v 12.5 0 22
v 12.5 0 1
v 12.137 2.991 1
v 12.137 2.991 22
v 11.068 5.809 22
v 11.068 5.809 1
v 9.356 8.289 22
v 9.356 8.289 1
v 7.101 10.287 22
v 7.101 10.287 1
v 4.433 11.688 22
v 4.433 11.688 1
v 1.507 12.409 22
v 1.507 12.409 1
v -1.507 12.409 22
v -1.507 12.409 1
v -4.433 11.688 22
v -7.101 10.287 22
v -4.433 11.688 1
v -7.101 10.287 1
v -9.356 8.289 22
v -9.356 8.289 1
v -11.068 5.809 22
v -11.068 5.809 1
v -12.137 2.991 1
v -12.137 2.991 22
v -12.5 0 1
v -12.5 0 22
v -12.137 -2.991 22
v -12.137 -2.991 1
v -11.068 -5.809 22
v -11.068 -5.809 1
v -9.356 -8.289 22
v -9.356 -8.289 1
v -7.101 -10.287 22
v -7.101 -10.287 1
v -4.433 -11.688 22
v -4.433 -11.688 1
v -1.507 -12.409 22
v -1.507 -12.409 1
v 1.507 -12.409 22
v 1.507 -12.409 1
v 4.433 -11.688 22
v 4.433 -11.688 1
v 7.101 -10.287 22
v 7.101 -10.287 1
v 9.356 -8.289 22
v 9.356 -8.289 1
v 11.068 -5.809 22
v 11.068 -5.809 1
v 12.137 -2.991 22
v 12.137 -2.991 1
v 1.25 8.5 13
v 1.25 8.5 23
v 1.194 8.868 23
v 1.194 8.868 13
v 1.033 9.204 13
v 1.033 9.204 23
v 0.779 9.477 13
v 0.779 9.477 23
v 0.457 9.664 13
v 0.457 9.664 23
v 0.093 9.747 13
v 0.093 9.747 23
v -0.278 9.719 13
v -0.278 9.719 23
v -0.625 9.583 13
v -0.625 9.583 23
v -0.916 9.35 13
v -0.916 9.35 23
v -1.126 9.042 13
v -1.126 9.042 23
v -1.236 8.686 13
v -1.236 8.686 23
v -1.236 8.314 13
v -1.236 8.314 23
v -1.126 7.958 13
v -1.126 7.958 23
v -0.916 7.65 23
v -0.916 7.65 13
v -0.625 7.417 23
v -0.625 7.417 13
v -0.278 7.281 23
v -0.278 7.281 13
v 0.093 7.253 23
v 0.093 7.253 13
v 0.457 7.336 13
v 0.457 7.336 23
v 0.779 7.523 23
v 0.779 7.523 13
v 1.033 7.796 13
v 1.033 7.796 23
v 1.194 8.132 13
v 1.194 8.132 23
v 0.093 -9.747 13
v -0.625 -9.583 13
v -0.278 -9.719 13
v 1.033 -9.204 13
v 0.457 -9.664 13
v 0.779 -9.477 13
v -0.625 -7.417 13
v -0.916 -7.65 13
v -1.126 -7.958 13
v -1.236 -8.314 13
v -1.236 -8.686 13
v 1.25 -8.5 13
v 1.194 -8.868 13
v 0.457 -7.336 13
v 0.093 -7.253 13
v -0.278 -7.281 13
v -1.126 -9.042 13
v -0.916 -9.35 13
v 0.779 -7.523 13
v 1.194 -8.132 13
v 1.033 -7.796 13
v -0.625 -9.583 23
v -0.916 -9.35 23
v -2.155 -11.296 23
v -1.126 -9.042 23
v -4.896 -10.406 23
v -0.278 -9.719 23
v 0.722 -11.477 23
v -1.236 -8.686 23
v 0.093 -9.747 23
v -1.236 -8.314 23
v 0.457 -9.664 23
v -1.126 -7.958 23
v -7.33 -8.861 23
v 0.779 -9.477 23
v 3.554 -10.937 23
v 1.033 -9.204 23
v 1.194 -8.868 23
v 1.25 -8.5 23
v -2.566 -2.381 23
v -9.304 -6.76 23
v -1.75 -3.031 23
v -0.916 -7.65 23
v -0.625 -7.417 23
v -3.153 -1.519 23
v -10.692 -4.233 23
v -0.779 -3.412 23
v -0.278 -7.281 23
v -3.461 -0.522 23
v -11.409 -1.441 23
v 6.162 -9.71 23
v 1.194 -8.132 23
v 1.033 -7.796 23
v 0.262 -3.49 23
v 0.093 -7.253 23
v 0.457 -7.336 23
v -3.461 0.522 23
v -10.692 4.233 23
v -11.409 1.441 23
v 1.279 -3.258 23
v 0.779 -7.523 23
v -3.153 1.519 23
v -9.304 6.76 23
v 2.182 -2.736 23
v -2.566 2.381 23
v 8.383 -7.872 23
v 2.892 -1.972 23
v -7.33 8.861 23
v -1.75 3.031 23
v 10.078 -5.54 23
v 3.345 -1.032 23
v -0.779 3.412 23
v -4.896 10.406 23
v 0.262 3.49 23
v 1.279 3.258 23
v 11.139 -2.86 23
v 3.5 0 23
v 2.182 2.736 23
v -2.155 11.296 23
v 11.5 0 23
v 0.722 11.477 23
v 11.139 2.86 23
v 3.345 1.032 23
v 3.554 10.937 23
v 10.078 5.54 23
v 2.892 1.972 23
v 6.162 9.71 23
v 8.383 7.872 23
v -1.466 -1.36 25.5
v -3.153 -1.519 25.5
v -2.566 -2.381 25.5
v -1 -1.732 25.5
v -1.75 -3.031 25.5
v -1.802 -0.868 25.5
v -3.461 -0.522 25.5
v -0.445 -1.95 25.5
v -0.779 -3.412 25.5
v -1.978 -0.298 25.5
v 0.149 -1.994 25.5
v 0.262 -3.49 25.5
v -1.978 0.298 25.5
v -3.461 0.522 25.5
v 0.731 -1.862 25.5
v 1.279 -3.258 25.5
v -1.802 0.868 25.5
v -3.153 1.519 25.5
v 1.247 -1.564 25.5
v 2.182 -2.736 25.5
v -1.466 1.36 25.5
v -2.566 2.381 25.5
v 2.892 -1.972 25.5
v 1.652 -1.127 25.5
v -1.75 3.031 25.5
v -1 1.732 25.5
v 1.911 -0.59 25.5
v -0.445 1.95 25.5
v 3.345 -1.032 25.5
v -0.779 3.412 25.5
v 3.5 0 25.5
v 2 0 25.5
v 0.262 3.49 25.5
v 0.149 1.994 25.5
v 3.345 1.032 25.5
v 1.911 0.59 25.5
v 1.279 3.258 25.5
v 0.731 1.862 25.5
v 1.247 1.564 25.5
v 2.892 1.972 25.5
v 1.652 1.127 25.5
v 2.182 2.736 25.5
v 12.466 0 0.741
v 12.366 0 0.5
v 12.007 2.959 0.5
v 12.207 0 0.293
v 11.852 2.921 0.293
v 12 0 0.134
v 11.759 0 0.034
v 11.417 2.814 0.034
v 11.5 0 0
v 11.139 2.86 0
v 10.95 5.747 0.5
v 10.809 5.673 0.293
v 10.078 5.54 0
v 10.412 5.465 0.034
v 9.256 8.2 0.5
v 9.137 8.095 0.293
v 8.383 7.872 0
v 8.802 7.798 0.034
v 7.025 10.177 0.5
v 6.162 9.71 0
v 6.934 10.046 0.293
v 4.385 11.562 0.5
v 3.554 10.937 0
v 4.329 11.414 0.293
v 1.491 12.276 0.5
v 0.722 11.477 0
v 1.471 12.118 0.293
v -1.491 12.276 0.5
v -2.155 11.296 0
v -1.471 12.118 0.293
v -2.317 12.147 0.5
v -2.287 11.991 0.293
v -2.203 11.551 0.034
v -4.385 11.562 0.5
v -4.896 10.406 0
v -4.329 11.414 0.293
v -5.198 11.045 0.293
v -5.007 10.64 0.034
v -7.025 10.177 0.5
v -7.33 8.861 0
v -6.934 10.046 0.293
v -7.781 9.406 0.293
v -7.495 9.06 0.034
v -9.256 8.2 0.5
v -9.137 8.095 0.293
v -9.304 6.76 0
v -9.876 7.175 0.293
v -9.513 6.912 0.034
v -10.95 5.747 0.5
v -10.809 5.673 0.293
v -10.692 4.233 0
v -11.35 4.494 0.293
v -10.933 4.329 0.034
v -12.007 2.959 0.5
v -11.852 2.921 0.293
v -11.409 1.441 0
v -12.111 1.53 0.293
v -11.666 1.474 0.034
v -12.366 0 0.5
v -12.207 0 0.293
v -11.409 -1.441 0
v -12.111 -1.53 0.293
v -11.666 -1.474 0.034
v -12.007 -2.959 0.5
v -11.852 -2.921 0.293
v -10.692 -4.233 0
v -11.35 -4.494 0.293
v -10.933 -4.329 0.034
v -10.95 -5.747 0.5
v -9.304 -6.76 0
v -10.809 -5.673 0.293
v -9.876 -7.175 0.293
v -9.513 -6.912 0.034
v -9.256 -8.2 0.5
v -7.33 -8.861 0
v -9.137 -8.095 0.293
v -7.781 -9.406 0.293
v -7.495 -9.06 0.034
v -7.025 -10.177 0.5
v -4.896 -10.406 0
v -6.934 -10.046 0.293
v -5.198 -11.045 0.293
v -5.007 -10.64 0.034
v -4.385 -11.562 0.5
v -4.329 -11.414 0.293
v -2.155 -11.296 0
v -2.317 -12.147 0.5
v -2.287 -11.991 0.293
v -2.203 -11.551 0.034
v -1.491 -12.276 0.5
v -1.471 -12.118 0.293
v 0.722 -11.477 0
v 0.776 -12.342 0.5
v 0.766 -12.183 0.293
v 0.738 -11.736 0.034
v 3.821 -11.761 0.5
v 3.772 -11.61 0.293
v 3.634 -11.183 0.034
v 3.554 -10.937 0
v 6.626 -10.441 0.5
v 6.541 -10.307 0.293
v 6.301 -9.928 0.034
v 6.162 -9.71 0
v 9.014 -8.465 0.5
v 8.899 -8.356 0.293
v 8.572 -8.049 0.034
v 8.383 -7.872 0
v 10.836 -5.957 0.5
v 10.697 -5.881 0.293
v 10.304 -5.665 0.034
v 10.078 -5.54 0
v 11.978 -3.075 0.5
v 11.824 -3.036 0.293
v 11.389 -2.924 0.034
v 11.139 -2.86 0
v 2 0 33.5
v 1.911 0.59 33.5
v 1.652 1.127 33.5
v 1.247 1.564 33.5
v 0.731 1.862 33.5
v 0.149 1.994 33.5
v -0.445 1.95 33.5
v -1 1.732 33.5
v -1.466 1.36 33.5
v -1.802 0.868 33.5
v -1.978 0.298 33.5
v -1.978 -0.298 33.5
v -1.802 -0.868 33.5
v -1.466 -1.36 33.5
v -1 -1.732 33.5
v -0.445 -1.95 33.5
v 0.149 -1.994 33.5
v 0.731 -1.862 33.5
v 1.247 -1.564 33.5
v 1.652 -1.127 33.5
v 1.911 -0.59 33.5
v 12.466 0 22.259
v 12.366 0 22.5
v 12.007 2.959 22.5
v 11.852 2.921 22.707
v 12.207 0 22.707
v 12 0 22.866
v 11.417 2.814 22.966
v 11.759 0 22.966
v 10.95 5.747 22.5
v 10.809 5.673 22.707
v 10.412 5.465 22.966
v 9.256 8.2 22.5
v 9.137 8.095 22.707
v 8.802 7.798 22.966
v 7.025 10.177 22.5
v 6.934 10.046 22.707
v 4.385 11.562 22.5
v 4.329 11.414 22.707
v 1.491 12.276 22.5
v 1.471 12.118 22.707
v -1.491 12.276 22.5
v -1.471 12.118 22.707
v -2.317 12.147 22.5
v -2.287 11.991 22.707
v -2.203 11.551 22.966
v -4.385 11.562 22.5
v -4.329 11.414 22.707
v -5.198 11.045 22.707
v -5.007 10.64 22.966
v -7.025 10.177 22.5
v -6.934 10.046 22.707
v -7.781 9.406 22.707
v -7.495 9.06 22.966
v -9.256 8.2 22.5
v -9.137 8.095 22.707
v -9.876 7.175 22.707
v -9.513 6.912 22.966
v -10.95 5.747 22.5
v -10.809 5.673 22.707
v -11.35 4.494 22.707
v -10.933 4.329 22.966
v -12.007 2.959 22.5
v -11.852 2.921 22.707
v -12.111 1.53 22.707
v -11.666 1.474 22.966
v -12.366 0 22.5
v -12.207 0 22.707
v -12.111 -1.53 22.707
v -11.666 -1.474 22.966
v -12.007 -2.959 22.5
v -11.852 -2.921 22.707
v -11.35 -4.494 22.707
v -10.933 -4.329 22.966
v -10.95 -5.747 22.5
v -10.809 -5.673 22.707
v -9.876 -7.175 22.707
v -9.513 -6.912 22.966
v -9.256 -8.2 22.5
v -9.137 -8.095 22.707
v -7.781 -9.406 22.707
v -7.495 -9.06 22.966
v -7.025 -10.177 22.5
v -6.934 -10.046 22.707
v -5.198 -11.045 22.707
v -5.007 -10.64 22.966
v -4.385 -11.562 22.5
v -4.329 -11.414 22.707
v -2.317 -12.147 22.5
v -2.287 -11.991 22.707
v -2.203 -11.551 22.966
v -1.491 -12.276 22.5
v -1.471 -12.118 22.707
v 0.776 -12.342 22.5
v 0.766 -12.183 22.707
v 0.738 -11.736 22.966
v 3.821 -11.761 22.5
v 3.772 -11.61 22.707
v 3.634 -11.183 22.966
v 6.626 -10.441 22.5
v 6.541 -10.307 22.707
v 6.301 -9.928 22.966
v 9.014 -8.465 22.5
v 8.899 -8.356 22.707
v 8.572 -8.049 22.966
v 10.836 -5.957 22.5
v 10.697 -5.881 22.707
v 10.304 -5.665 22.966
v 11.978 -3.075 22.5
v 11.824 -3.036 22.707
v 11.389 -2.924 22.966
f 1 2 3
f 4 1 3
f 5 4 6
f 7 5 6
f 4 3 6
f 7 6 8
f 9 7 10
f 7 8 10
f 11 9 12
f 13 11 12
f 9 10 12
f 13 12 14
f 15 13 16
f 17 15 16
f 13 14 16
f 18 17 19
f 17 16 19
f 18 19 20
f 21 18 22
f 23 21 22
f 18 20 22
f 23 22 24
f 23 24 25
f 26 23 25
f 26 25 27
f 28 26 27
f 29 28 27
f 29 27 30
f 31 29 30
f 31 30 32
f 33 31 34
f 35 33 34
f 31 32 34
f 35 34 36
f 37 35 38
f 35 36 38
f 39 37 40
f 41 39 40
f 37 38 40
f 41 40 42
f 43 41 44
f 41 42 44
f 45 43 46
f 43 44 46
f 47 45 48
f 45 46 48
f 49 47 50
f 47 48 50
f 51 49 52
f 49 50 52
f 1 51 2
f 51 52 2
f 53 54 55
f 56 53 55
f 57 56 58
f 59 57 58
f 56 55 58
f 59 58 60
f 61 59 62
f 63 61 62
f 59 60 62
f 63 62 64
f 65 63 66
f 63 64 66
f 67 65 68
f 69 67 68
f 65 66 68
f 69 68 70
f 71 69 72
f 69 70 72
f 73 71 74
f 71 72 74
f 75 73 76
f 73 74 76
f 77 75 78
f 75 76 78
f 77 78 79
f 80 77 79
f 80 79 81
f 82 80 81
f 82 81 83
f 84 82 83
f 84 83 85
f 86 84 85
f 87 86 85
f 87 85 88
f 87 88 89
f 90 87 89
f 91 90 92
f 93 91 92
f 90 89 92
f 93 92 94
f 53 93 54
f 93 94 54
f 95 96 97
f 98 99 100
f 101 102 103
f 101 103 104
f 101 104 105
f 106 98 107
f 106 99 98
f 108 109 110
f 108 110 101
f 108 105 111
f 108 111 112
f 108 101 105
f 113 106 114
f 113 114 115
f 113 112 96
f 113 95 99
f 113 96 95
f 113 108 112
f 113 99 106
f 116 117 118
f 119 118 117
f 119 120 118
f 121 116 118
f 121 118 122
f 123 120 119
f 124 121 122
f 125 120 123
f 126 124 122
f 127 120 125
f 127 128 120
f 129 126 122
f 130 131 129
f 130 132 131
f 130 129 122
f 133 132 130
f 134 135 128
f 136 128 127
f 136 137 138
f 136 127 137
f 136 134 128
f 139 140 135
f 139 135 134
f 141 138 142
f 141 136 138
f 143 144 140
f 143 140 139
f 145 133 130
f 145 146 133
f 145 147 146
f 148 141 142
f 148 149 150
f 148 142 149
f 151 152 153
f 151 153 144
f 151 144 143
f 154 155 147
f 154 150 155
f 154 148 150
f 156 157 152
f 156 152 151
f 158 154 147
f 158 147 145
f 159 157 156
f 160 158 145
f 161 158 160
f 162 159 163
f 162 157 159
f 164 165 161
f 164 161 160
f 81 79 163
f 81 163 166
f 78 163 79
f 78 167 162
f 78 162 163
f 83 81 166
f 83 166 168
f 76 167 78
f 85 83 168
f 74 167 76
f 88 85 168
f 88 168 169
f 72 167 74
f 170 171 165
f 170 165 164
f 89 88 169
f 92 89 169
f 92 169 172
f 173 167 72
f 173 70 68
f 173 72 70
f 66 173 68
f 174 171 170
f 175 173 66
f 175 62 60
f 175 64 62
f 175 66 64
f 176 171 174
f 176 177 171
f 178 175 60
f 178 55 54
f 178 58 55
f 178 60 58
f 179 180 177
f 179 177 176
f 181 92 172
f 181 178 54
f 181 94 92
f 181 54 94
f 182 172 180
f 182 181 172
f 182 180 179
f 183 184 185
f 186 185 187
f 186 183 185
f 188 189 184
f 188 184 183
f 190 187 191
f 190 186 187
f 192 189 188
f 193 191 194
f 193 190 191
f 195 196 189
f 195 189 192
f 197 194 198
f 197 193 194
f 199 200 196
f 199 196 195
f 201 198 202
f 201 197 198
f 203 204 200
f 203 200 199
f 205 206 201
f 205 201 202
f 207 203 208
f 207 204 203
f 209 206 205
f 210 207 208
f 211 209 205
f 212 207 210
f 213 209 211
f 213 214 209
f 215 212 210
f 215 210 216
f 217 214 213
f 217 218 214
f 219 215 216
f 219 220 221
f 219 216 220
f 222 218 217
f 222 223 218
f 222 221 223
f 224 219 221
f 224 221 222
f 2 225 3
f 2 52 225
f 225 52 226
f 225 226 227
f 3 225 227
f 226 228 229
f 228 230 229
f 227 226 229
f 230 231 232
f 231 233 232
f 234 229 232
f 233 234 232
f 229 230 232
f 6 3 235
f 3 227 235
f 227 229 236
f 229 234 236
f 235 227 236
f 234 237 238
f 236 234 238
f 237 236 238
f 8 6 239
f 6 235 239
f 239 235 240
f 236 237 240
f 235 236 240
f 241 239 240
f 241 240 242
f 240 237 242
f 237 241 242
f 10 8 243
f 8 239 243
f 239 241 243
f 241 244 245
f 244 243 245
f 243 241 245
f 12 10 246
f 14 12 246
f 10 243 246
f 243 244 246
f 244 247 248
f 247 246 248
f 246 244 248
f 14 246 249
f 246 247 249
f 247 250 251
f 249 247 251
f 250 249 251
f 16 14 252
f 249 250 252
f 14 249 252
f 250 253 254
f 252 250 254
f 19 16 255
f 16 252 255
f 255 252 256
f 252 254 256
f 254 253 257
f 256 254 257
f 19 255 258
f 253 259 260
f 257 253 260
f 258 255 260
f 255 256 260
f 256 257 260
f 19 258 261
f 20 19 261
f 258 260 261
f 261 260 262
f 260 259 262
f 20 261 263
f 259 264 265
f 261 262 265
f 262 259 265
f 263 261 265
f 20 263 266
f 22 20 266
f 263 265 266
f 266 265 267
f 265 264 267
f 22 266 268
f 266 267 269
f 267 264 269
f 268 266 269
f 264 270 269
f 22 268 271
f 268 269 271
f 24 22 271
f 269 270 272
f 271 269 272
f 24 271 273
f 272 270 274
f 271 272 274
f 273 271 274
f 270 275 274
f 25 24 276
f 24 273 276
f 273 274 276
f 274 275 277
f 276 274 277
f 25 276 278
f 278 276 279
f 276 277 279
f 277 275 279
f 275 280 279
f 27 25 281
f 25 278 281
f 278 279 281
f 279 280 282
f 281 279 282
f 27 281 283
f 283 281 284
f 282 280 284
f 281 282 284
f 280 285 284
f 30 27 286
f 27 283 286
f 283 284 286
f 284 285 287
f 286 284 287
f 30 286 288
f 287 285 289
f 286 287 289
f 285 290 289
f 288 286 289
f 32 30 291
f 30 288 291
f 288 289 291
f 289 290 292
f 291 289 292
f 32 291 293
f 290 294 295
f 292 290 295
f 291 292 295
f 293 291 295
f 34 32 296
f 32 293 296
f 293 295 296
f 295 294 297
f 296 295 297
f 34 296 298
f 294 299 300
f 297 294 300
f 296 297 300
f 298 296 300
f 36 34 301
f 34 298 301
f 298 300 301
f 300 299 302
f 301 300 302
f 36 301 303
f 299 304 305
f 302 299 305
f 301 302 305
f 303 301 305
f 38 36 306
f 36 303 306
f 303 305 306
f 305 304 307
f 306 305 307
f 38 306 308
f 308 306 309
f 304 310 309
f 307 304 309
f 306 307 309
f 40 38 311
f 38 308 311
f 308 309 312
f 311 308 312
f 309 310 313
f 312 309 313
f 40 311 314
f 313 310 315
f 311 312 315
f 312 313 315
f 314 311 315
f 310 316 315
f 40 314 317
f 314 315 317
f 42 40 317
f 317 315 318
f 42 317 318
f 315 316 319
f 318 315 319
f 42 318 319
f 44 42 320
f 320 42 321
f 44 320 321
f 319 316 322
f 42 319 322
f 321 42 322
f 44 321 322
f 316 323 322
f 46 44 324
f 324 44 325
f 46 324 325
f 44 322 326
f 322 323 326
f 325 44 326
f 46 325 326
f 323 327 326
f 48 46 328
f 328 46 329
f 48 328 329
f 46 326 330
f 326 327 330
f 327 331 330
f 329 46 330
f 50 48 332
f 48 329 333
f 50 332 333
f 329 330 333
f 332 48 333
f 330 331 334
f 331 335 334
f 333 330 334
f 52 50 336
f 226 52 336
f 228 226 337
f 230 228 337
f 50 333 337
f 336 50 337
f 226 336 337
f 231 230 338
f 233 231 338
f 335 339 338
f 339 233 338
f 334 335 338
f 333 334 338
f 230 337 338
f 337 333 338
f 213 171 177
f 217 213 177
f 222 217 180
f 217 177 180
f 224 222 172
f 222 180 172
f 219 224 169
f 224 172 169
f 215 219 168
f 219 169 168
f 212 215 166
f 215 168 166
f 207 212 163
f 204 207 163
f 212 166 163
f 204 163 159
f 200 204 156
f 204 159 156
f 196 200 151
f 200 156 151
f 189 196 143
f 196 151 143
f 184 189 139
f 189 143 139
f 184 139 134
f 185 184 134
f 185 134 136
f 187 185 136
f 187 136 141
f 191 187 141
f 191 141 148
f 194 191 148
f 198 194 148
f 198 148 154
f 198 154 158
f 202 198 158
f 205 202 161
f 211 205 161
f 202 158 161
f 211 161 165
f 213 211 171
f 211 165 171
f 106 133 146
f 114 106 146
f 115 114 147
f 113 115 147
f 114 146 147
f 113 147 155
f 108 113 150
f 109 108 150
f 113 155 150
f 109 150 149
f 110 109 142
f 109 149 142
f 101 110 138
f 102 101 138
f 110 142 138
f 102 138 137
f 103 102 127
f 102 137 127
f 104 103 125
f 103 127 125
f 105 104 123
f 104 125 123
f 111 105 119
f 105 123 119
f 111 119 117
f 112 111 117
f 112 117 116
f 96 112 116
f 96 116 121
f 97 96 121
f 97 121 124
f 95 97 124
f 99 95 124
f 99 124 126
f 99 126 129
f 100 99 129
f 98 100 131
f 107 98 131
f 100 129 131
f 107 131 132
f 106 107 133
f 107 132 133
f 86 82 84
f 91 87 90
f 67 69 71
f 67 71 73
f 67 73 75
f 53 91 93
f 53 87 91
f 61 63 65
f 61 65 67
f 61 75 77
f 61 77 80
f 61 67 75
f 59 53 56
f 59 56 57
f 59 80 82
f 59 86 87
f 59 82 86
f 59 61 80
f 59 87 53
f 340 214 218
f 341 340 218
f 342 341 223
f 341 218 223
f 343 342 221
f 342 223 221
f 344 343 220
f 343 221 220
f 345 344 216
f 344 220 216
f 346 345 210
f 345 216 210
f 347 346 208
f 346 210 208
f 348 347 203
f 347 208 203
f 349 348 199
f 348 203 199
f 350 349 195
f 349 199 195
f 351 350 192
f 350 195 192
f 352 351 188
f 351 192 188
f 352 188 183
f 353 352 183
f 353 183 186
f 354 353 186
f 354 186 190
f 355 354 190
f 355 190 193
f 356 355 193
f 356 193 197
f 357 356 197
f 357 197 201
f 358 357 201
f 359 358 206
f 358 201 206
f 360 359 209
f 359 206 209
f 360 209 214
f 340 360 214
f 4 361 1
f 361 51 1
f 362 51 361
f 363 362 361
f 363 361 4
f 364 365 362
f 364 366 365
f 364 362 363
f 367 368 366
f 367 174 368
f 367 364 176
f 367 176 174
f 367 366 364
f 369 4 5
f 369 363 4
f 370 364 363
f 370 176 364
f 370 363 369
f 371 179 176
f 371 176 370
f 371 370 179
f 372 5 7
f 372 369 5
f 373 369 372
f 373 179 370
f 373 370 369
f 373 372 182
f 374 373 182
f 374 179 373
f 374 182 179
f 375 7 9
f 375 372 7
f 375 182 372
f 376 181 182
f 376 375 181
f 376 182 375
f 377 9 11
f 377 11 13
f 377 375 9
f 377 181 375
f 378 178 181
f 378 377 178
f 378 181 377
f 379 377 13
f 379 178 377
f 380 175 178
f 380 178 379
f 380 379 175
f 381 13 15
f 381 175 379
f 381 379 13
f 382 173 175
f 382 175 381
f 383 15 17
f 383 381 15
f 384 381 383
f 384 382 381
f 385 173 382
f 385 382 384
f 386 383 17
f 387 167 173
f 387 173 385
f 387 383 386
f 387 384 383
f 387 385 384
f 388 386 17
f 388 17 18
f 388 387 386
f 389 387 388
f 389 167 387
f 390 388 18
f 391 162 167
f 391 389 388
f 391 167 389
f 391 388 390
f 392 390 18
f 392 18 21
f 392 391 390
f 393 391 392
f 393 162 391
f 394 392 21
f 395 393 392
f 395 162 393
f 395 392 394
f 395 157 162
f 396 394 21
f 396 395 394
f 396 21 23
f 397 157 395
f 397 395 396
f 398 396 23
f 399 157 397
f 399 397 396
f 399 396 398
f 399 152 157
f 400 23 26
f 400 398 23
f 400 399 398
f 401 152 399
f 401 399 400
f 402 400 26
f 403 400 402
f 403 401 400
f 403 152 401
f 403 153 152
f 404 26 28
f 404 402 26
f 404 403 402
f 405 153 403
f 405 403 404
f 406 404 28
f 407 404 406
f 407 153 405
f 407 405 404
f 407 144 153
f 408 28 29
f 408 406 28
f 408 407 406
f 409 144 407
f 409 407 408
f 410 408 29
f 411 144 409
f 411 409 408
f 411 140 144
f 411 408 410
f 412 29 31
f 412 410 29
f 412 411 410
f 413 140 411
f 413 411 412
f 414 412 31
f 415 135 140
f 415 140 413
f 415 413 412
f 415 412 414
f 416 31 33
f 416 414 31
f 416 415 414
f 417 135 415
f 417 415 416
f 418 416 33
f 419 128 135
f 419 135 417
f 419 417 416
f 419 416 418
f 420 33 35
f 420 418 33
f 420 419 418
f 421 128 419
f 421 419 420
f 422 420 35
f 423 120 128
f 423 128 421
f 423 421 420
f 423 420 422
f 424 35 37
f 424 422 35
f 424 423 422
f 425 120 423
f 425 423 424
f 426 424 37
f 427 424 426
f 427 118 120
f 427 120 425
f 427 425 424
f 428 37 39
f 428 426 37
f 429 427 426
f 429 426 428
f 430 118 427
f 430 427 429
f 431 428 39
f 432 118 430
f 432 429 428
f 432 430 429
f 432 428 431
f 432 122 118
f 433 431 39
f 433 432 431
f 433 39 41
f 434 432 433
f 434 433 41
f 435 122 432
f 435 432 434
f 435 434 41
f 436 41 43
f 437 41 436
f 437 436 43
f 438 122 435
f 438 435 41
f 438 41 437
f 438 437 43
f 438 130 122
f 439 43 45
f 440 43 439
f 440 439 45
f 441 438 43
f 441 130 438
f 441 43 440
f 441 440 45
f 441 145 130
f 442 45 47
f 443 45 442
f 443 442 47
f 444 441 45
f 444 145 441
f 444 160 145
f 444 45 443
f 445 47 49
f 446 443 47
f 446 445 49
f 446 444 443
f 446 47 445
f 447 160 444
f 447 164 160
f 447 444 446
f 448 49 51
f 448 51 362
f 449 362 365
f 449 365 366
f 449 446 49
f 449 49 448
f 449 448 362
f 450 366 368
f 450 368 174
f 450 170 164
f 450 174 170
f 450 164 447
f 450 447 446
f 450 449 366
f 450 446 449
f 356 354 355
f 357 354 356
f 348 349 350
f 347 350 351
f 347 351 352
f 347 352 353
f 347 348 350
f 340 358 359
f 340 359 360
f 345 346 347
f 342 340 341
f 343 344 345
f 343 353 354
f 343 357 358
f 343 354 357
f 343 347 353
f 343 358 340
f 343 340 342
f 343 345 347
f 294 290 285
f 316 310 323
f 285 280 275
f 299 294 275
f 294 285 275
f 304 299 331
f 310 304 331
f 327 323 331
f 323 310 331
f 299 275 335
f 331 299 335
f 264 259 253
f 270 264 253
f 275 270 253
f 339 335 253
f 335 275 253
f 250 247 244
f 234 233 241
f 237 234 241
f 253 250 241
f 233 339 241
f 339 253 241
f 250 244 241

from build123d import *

# Parameters (mm, degrees)
ESBO_O1_R                = 12.5
RESSALTO_EXTRUS_O1_DEPTH = 23
ESBO_O2_R                = 3.5
RESSALTO_EXTRUS_O2_DEPTH = 2.5
FILETE1_R                = 1
ESBO_O3_R                = 2
RESSALTO_EXTRUS_O3_DEPTH = 8
ESBO_O4_R                = 1.25
CORTE_EXTRUS_O1_DEPTH    = 10


with BuildPart() as part:
    # Esboço1 → Ressalto-extrusão1 (new body)
    with BuildSketch(Plane.XY):
        Circle(ESBO_O1_R)
    extrude(amount=RESSALTO_EXTRUS_O1_DEPTH)

    # Esboço2 → Ressalto-extrusão2 (add)
    with BuildSketch(Plane.XY.offset(23)):
        Circle(ESBO_O2_R)
    extrude(amount=RESSALTO_EXTRUS_O2_DEPTH)

    # Filete1
    filete1_edges = [part.edges().sort_by_distance(p)[0] for p in [
        (-12.5, 0, 0),
        (-12.5, 0, 23),
    ]]
    fillet(filete1_edges, radius=FILETE1_R)

    # Esboço3 → Ressalto-extrusão3 (add)
    with BuildSketch(Plane.XY.offset(25.5)):
        Circle(ESBO_O3_R)
    extrude(amount=RESSALTO_EXTRUS_O3_DEPTH)

    # Esboço4 → Corte-extrusão1 (cut)
    with BuildSketch(Plane.XY.offset(23)):
        with Locations((0, 8.5)):
            Circle(ESBO_O4_R)
        with Locations((0, -8.5)):
            Circle(ESBO_O4_R)
    extrude(amount=-CORTE_EXTRUS_O1_DEPTH, mode=Mode.SUBTRACT)


solid = part.part
